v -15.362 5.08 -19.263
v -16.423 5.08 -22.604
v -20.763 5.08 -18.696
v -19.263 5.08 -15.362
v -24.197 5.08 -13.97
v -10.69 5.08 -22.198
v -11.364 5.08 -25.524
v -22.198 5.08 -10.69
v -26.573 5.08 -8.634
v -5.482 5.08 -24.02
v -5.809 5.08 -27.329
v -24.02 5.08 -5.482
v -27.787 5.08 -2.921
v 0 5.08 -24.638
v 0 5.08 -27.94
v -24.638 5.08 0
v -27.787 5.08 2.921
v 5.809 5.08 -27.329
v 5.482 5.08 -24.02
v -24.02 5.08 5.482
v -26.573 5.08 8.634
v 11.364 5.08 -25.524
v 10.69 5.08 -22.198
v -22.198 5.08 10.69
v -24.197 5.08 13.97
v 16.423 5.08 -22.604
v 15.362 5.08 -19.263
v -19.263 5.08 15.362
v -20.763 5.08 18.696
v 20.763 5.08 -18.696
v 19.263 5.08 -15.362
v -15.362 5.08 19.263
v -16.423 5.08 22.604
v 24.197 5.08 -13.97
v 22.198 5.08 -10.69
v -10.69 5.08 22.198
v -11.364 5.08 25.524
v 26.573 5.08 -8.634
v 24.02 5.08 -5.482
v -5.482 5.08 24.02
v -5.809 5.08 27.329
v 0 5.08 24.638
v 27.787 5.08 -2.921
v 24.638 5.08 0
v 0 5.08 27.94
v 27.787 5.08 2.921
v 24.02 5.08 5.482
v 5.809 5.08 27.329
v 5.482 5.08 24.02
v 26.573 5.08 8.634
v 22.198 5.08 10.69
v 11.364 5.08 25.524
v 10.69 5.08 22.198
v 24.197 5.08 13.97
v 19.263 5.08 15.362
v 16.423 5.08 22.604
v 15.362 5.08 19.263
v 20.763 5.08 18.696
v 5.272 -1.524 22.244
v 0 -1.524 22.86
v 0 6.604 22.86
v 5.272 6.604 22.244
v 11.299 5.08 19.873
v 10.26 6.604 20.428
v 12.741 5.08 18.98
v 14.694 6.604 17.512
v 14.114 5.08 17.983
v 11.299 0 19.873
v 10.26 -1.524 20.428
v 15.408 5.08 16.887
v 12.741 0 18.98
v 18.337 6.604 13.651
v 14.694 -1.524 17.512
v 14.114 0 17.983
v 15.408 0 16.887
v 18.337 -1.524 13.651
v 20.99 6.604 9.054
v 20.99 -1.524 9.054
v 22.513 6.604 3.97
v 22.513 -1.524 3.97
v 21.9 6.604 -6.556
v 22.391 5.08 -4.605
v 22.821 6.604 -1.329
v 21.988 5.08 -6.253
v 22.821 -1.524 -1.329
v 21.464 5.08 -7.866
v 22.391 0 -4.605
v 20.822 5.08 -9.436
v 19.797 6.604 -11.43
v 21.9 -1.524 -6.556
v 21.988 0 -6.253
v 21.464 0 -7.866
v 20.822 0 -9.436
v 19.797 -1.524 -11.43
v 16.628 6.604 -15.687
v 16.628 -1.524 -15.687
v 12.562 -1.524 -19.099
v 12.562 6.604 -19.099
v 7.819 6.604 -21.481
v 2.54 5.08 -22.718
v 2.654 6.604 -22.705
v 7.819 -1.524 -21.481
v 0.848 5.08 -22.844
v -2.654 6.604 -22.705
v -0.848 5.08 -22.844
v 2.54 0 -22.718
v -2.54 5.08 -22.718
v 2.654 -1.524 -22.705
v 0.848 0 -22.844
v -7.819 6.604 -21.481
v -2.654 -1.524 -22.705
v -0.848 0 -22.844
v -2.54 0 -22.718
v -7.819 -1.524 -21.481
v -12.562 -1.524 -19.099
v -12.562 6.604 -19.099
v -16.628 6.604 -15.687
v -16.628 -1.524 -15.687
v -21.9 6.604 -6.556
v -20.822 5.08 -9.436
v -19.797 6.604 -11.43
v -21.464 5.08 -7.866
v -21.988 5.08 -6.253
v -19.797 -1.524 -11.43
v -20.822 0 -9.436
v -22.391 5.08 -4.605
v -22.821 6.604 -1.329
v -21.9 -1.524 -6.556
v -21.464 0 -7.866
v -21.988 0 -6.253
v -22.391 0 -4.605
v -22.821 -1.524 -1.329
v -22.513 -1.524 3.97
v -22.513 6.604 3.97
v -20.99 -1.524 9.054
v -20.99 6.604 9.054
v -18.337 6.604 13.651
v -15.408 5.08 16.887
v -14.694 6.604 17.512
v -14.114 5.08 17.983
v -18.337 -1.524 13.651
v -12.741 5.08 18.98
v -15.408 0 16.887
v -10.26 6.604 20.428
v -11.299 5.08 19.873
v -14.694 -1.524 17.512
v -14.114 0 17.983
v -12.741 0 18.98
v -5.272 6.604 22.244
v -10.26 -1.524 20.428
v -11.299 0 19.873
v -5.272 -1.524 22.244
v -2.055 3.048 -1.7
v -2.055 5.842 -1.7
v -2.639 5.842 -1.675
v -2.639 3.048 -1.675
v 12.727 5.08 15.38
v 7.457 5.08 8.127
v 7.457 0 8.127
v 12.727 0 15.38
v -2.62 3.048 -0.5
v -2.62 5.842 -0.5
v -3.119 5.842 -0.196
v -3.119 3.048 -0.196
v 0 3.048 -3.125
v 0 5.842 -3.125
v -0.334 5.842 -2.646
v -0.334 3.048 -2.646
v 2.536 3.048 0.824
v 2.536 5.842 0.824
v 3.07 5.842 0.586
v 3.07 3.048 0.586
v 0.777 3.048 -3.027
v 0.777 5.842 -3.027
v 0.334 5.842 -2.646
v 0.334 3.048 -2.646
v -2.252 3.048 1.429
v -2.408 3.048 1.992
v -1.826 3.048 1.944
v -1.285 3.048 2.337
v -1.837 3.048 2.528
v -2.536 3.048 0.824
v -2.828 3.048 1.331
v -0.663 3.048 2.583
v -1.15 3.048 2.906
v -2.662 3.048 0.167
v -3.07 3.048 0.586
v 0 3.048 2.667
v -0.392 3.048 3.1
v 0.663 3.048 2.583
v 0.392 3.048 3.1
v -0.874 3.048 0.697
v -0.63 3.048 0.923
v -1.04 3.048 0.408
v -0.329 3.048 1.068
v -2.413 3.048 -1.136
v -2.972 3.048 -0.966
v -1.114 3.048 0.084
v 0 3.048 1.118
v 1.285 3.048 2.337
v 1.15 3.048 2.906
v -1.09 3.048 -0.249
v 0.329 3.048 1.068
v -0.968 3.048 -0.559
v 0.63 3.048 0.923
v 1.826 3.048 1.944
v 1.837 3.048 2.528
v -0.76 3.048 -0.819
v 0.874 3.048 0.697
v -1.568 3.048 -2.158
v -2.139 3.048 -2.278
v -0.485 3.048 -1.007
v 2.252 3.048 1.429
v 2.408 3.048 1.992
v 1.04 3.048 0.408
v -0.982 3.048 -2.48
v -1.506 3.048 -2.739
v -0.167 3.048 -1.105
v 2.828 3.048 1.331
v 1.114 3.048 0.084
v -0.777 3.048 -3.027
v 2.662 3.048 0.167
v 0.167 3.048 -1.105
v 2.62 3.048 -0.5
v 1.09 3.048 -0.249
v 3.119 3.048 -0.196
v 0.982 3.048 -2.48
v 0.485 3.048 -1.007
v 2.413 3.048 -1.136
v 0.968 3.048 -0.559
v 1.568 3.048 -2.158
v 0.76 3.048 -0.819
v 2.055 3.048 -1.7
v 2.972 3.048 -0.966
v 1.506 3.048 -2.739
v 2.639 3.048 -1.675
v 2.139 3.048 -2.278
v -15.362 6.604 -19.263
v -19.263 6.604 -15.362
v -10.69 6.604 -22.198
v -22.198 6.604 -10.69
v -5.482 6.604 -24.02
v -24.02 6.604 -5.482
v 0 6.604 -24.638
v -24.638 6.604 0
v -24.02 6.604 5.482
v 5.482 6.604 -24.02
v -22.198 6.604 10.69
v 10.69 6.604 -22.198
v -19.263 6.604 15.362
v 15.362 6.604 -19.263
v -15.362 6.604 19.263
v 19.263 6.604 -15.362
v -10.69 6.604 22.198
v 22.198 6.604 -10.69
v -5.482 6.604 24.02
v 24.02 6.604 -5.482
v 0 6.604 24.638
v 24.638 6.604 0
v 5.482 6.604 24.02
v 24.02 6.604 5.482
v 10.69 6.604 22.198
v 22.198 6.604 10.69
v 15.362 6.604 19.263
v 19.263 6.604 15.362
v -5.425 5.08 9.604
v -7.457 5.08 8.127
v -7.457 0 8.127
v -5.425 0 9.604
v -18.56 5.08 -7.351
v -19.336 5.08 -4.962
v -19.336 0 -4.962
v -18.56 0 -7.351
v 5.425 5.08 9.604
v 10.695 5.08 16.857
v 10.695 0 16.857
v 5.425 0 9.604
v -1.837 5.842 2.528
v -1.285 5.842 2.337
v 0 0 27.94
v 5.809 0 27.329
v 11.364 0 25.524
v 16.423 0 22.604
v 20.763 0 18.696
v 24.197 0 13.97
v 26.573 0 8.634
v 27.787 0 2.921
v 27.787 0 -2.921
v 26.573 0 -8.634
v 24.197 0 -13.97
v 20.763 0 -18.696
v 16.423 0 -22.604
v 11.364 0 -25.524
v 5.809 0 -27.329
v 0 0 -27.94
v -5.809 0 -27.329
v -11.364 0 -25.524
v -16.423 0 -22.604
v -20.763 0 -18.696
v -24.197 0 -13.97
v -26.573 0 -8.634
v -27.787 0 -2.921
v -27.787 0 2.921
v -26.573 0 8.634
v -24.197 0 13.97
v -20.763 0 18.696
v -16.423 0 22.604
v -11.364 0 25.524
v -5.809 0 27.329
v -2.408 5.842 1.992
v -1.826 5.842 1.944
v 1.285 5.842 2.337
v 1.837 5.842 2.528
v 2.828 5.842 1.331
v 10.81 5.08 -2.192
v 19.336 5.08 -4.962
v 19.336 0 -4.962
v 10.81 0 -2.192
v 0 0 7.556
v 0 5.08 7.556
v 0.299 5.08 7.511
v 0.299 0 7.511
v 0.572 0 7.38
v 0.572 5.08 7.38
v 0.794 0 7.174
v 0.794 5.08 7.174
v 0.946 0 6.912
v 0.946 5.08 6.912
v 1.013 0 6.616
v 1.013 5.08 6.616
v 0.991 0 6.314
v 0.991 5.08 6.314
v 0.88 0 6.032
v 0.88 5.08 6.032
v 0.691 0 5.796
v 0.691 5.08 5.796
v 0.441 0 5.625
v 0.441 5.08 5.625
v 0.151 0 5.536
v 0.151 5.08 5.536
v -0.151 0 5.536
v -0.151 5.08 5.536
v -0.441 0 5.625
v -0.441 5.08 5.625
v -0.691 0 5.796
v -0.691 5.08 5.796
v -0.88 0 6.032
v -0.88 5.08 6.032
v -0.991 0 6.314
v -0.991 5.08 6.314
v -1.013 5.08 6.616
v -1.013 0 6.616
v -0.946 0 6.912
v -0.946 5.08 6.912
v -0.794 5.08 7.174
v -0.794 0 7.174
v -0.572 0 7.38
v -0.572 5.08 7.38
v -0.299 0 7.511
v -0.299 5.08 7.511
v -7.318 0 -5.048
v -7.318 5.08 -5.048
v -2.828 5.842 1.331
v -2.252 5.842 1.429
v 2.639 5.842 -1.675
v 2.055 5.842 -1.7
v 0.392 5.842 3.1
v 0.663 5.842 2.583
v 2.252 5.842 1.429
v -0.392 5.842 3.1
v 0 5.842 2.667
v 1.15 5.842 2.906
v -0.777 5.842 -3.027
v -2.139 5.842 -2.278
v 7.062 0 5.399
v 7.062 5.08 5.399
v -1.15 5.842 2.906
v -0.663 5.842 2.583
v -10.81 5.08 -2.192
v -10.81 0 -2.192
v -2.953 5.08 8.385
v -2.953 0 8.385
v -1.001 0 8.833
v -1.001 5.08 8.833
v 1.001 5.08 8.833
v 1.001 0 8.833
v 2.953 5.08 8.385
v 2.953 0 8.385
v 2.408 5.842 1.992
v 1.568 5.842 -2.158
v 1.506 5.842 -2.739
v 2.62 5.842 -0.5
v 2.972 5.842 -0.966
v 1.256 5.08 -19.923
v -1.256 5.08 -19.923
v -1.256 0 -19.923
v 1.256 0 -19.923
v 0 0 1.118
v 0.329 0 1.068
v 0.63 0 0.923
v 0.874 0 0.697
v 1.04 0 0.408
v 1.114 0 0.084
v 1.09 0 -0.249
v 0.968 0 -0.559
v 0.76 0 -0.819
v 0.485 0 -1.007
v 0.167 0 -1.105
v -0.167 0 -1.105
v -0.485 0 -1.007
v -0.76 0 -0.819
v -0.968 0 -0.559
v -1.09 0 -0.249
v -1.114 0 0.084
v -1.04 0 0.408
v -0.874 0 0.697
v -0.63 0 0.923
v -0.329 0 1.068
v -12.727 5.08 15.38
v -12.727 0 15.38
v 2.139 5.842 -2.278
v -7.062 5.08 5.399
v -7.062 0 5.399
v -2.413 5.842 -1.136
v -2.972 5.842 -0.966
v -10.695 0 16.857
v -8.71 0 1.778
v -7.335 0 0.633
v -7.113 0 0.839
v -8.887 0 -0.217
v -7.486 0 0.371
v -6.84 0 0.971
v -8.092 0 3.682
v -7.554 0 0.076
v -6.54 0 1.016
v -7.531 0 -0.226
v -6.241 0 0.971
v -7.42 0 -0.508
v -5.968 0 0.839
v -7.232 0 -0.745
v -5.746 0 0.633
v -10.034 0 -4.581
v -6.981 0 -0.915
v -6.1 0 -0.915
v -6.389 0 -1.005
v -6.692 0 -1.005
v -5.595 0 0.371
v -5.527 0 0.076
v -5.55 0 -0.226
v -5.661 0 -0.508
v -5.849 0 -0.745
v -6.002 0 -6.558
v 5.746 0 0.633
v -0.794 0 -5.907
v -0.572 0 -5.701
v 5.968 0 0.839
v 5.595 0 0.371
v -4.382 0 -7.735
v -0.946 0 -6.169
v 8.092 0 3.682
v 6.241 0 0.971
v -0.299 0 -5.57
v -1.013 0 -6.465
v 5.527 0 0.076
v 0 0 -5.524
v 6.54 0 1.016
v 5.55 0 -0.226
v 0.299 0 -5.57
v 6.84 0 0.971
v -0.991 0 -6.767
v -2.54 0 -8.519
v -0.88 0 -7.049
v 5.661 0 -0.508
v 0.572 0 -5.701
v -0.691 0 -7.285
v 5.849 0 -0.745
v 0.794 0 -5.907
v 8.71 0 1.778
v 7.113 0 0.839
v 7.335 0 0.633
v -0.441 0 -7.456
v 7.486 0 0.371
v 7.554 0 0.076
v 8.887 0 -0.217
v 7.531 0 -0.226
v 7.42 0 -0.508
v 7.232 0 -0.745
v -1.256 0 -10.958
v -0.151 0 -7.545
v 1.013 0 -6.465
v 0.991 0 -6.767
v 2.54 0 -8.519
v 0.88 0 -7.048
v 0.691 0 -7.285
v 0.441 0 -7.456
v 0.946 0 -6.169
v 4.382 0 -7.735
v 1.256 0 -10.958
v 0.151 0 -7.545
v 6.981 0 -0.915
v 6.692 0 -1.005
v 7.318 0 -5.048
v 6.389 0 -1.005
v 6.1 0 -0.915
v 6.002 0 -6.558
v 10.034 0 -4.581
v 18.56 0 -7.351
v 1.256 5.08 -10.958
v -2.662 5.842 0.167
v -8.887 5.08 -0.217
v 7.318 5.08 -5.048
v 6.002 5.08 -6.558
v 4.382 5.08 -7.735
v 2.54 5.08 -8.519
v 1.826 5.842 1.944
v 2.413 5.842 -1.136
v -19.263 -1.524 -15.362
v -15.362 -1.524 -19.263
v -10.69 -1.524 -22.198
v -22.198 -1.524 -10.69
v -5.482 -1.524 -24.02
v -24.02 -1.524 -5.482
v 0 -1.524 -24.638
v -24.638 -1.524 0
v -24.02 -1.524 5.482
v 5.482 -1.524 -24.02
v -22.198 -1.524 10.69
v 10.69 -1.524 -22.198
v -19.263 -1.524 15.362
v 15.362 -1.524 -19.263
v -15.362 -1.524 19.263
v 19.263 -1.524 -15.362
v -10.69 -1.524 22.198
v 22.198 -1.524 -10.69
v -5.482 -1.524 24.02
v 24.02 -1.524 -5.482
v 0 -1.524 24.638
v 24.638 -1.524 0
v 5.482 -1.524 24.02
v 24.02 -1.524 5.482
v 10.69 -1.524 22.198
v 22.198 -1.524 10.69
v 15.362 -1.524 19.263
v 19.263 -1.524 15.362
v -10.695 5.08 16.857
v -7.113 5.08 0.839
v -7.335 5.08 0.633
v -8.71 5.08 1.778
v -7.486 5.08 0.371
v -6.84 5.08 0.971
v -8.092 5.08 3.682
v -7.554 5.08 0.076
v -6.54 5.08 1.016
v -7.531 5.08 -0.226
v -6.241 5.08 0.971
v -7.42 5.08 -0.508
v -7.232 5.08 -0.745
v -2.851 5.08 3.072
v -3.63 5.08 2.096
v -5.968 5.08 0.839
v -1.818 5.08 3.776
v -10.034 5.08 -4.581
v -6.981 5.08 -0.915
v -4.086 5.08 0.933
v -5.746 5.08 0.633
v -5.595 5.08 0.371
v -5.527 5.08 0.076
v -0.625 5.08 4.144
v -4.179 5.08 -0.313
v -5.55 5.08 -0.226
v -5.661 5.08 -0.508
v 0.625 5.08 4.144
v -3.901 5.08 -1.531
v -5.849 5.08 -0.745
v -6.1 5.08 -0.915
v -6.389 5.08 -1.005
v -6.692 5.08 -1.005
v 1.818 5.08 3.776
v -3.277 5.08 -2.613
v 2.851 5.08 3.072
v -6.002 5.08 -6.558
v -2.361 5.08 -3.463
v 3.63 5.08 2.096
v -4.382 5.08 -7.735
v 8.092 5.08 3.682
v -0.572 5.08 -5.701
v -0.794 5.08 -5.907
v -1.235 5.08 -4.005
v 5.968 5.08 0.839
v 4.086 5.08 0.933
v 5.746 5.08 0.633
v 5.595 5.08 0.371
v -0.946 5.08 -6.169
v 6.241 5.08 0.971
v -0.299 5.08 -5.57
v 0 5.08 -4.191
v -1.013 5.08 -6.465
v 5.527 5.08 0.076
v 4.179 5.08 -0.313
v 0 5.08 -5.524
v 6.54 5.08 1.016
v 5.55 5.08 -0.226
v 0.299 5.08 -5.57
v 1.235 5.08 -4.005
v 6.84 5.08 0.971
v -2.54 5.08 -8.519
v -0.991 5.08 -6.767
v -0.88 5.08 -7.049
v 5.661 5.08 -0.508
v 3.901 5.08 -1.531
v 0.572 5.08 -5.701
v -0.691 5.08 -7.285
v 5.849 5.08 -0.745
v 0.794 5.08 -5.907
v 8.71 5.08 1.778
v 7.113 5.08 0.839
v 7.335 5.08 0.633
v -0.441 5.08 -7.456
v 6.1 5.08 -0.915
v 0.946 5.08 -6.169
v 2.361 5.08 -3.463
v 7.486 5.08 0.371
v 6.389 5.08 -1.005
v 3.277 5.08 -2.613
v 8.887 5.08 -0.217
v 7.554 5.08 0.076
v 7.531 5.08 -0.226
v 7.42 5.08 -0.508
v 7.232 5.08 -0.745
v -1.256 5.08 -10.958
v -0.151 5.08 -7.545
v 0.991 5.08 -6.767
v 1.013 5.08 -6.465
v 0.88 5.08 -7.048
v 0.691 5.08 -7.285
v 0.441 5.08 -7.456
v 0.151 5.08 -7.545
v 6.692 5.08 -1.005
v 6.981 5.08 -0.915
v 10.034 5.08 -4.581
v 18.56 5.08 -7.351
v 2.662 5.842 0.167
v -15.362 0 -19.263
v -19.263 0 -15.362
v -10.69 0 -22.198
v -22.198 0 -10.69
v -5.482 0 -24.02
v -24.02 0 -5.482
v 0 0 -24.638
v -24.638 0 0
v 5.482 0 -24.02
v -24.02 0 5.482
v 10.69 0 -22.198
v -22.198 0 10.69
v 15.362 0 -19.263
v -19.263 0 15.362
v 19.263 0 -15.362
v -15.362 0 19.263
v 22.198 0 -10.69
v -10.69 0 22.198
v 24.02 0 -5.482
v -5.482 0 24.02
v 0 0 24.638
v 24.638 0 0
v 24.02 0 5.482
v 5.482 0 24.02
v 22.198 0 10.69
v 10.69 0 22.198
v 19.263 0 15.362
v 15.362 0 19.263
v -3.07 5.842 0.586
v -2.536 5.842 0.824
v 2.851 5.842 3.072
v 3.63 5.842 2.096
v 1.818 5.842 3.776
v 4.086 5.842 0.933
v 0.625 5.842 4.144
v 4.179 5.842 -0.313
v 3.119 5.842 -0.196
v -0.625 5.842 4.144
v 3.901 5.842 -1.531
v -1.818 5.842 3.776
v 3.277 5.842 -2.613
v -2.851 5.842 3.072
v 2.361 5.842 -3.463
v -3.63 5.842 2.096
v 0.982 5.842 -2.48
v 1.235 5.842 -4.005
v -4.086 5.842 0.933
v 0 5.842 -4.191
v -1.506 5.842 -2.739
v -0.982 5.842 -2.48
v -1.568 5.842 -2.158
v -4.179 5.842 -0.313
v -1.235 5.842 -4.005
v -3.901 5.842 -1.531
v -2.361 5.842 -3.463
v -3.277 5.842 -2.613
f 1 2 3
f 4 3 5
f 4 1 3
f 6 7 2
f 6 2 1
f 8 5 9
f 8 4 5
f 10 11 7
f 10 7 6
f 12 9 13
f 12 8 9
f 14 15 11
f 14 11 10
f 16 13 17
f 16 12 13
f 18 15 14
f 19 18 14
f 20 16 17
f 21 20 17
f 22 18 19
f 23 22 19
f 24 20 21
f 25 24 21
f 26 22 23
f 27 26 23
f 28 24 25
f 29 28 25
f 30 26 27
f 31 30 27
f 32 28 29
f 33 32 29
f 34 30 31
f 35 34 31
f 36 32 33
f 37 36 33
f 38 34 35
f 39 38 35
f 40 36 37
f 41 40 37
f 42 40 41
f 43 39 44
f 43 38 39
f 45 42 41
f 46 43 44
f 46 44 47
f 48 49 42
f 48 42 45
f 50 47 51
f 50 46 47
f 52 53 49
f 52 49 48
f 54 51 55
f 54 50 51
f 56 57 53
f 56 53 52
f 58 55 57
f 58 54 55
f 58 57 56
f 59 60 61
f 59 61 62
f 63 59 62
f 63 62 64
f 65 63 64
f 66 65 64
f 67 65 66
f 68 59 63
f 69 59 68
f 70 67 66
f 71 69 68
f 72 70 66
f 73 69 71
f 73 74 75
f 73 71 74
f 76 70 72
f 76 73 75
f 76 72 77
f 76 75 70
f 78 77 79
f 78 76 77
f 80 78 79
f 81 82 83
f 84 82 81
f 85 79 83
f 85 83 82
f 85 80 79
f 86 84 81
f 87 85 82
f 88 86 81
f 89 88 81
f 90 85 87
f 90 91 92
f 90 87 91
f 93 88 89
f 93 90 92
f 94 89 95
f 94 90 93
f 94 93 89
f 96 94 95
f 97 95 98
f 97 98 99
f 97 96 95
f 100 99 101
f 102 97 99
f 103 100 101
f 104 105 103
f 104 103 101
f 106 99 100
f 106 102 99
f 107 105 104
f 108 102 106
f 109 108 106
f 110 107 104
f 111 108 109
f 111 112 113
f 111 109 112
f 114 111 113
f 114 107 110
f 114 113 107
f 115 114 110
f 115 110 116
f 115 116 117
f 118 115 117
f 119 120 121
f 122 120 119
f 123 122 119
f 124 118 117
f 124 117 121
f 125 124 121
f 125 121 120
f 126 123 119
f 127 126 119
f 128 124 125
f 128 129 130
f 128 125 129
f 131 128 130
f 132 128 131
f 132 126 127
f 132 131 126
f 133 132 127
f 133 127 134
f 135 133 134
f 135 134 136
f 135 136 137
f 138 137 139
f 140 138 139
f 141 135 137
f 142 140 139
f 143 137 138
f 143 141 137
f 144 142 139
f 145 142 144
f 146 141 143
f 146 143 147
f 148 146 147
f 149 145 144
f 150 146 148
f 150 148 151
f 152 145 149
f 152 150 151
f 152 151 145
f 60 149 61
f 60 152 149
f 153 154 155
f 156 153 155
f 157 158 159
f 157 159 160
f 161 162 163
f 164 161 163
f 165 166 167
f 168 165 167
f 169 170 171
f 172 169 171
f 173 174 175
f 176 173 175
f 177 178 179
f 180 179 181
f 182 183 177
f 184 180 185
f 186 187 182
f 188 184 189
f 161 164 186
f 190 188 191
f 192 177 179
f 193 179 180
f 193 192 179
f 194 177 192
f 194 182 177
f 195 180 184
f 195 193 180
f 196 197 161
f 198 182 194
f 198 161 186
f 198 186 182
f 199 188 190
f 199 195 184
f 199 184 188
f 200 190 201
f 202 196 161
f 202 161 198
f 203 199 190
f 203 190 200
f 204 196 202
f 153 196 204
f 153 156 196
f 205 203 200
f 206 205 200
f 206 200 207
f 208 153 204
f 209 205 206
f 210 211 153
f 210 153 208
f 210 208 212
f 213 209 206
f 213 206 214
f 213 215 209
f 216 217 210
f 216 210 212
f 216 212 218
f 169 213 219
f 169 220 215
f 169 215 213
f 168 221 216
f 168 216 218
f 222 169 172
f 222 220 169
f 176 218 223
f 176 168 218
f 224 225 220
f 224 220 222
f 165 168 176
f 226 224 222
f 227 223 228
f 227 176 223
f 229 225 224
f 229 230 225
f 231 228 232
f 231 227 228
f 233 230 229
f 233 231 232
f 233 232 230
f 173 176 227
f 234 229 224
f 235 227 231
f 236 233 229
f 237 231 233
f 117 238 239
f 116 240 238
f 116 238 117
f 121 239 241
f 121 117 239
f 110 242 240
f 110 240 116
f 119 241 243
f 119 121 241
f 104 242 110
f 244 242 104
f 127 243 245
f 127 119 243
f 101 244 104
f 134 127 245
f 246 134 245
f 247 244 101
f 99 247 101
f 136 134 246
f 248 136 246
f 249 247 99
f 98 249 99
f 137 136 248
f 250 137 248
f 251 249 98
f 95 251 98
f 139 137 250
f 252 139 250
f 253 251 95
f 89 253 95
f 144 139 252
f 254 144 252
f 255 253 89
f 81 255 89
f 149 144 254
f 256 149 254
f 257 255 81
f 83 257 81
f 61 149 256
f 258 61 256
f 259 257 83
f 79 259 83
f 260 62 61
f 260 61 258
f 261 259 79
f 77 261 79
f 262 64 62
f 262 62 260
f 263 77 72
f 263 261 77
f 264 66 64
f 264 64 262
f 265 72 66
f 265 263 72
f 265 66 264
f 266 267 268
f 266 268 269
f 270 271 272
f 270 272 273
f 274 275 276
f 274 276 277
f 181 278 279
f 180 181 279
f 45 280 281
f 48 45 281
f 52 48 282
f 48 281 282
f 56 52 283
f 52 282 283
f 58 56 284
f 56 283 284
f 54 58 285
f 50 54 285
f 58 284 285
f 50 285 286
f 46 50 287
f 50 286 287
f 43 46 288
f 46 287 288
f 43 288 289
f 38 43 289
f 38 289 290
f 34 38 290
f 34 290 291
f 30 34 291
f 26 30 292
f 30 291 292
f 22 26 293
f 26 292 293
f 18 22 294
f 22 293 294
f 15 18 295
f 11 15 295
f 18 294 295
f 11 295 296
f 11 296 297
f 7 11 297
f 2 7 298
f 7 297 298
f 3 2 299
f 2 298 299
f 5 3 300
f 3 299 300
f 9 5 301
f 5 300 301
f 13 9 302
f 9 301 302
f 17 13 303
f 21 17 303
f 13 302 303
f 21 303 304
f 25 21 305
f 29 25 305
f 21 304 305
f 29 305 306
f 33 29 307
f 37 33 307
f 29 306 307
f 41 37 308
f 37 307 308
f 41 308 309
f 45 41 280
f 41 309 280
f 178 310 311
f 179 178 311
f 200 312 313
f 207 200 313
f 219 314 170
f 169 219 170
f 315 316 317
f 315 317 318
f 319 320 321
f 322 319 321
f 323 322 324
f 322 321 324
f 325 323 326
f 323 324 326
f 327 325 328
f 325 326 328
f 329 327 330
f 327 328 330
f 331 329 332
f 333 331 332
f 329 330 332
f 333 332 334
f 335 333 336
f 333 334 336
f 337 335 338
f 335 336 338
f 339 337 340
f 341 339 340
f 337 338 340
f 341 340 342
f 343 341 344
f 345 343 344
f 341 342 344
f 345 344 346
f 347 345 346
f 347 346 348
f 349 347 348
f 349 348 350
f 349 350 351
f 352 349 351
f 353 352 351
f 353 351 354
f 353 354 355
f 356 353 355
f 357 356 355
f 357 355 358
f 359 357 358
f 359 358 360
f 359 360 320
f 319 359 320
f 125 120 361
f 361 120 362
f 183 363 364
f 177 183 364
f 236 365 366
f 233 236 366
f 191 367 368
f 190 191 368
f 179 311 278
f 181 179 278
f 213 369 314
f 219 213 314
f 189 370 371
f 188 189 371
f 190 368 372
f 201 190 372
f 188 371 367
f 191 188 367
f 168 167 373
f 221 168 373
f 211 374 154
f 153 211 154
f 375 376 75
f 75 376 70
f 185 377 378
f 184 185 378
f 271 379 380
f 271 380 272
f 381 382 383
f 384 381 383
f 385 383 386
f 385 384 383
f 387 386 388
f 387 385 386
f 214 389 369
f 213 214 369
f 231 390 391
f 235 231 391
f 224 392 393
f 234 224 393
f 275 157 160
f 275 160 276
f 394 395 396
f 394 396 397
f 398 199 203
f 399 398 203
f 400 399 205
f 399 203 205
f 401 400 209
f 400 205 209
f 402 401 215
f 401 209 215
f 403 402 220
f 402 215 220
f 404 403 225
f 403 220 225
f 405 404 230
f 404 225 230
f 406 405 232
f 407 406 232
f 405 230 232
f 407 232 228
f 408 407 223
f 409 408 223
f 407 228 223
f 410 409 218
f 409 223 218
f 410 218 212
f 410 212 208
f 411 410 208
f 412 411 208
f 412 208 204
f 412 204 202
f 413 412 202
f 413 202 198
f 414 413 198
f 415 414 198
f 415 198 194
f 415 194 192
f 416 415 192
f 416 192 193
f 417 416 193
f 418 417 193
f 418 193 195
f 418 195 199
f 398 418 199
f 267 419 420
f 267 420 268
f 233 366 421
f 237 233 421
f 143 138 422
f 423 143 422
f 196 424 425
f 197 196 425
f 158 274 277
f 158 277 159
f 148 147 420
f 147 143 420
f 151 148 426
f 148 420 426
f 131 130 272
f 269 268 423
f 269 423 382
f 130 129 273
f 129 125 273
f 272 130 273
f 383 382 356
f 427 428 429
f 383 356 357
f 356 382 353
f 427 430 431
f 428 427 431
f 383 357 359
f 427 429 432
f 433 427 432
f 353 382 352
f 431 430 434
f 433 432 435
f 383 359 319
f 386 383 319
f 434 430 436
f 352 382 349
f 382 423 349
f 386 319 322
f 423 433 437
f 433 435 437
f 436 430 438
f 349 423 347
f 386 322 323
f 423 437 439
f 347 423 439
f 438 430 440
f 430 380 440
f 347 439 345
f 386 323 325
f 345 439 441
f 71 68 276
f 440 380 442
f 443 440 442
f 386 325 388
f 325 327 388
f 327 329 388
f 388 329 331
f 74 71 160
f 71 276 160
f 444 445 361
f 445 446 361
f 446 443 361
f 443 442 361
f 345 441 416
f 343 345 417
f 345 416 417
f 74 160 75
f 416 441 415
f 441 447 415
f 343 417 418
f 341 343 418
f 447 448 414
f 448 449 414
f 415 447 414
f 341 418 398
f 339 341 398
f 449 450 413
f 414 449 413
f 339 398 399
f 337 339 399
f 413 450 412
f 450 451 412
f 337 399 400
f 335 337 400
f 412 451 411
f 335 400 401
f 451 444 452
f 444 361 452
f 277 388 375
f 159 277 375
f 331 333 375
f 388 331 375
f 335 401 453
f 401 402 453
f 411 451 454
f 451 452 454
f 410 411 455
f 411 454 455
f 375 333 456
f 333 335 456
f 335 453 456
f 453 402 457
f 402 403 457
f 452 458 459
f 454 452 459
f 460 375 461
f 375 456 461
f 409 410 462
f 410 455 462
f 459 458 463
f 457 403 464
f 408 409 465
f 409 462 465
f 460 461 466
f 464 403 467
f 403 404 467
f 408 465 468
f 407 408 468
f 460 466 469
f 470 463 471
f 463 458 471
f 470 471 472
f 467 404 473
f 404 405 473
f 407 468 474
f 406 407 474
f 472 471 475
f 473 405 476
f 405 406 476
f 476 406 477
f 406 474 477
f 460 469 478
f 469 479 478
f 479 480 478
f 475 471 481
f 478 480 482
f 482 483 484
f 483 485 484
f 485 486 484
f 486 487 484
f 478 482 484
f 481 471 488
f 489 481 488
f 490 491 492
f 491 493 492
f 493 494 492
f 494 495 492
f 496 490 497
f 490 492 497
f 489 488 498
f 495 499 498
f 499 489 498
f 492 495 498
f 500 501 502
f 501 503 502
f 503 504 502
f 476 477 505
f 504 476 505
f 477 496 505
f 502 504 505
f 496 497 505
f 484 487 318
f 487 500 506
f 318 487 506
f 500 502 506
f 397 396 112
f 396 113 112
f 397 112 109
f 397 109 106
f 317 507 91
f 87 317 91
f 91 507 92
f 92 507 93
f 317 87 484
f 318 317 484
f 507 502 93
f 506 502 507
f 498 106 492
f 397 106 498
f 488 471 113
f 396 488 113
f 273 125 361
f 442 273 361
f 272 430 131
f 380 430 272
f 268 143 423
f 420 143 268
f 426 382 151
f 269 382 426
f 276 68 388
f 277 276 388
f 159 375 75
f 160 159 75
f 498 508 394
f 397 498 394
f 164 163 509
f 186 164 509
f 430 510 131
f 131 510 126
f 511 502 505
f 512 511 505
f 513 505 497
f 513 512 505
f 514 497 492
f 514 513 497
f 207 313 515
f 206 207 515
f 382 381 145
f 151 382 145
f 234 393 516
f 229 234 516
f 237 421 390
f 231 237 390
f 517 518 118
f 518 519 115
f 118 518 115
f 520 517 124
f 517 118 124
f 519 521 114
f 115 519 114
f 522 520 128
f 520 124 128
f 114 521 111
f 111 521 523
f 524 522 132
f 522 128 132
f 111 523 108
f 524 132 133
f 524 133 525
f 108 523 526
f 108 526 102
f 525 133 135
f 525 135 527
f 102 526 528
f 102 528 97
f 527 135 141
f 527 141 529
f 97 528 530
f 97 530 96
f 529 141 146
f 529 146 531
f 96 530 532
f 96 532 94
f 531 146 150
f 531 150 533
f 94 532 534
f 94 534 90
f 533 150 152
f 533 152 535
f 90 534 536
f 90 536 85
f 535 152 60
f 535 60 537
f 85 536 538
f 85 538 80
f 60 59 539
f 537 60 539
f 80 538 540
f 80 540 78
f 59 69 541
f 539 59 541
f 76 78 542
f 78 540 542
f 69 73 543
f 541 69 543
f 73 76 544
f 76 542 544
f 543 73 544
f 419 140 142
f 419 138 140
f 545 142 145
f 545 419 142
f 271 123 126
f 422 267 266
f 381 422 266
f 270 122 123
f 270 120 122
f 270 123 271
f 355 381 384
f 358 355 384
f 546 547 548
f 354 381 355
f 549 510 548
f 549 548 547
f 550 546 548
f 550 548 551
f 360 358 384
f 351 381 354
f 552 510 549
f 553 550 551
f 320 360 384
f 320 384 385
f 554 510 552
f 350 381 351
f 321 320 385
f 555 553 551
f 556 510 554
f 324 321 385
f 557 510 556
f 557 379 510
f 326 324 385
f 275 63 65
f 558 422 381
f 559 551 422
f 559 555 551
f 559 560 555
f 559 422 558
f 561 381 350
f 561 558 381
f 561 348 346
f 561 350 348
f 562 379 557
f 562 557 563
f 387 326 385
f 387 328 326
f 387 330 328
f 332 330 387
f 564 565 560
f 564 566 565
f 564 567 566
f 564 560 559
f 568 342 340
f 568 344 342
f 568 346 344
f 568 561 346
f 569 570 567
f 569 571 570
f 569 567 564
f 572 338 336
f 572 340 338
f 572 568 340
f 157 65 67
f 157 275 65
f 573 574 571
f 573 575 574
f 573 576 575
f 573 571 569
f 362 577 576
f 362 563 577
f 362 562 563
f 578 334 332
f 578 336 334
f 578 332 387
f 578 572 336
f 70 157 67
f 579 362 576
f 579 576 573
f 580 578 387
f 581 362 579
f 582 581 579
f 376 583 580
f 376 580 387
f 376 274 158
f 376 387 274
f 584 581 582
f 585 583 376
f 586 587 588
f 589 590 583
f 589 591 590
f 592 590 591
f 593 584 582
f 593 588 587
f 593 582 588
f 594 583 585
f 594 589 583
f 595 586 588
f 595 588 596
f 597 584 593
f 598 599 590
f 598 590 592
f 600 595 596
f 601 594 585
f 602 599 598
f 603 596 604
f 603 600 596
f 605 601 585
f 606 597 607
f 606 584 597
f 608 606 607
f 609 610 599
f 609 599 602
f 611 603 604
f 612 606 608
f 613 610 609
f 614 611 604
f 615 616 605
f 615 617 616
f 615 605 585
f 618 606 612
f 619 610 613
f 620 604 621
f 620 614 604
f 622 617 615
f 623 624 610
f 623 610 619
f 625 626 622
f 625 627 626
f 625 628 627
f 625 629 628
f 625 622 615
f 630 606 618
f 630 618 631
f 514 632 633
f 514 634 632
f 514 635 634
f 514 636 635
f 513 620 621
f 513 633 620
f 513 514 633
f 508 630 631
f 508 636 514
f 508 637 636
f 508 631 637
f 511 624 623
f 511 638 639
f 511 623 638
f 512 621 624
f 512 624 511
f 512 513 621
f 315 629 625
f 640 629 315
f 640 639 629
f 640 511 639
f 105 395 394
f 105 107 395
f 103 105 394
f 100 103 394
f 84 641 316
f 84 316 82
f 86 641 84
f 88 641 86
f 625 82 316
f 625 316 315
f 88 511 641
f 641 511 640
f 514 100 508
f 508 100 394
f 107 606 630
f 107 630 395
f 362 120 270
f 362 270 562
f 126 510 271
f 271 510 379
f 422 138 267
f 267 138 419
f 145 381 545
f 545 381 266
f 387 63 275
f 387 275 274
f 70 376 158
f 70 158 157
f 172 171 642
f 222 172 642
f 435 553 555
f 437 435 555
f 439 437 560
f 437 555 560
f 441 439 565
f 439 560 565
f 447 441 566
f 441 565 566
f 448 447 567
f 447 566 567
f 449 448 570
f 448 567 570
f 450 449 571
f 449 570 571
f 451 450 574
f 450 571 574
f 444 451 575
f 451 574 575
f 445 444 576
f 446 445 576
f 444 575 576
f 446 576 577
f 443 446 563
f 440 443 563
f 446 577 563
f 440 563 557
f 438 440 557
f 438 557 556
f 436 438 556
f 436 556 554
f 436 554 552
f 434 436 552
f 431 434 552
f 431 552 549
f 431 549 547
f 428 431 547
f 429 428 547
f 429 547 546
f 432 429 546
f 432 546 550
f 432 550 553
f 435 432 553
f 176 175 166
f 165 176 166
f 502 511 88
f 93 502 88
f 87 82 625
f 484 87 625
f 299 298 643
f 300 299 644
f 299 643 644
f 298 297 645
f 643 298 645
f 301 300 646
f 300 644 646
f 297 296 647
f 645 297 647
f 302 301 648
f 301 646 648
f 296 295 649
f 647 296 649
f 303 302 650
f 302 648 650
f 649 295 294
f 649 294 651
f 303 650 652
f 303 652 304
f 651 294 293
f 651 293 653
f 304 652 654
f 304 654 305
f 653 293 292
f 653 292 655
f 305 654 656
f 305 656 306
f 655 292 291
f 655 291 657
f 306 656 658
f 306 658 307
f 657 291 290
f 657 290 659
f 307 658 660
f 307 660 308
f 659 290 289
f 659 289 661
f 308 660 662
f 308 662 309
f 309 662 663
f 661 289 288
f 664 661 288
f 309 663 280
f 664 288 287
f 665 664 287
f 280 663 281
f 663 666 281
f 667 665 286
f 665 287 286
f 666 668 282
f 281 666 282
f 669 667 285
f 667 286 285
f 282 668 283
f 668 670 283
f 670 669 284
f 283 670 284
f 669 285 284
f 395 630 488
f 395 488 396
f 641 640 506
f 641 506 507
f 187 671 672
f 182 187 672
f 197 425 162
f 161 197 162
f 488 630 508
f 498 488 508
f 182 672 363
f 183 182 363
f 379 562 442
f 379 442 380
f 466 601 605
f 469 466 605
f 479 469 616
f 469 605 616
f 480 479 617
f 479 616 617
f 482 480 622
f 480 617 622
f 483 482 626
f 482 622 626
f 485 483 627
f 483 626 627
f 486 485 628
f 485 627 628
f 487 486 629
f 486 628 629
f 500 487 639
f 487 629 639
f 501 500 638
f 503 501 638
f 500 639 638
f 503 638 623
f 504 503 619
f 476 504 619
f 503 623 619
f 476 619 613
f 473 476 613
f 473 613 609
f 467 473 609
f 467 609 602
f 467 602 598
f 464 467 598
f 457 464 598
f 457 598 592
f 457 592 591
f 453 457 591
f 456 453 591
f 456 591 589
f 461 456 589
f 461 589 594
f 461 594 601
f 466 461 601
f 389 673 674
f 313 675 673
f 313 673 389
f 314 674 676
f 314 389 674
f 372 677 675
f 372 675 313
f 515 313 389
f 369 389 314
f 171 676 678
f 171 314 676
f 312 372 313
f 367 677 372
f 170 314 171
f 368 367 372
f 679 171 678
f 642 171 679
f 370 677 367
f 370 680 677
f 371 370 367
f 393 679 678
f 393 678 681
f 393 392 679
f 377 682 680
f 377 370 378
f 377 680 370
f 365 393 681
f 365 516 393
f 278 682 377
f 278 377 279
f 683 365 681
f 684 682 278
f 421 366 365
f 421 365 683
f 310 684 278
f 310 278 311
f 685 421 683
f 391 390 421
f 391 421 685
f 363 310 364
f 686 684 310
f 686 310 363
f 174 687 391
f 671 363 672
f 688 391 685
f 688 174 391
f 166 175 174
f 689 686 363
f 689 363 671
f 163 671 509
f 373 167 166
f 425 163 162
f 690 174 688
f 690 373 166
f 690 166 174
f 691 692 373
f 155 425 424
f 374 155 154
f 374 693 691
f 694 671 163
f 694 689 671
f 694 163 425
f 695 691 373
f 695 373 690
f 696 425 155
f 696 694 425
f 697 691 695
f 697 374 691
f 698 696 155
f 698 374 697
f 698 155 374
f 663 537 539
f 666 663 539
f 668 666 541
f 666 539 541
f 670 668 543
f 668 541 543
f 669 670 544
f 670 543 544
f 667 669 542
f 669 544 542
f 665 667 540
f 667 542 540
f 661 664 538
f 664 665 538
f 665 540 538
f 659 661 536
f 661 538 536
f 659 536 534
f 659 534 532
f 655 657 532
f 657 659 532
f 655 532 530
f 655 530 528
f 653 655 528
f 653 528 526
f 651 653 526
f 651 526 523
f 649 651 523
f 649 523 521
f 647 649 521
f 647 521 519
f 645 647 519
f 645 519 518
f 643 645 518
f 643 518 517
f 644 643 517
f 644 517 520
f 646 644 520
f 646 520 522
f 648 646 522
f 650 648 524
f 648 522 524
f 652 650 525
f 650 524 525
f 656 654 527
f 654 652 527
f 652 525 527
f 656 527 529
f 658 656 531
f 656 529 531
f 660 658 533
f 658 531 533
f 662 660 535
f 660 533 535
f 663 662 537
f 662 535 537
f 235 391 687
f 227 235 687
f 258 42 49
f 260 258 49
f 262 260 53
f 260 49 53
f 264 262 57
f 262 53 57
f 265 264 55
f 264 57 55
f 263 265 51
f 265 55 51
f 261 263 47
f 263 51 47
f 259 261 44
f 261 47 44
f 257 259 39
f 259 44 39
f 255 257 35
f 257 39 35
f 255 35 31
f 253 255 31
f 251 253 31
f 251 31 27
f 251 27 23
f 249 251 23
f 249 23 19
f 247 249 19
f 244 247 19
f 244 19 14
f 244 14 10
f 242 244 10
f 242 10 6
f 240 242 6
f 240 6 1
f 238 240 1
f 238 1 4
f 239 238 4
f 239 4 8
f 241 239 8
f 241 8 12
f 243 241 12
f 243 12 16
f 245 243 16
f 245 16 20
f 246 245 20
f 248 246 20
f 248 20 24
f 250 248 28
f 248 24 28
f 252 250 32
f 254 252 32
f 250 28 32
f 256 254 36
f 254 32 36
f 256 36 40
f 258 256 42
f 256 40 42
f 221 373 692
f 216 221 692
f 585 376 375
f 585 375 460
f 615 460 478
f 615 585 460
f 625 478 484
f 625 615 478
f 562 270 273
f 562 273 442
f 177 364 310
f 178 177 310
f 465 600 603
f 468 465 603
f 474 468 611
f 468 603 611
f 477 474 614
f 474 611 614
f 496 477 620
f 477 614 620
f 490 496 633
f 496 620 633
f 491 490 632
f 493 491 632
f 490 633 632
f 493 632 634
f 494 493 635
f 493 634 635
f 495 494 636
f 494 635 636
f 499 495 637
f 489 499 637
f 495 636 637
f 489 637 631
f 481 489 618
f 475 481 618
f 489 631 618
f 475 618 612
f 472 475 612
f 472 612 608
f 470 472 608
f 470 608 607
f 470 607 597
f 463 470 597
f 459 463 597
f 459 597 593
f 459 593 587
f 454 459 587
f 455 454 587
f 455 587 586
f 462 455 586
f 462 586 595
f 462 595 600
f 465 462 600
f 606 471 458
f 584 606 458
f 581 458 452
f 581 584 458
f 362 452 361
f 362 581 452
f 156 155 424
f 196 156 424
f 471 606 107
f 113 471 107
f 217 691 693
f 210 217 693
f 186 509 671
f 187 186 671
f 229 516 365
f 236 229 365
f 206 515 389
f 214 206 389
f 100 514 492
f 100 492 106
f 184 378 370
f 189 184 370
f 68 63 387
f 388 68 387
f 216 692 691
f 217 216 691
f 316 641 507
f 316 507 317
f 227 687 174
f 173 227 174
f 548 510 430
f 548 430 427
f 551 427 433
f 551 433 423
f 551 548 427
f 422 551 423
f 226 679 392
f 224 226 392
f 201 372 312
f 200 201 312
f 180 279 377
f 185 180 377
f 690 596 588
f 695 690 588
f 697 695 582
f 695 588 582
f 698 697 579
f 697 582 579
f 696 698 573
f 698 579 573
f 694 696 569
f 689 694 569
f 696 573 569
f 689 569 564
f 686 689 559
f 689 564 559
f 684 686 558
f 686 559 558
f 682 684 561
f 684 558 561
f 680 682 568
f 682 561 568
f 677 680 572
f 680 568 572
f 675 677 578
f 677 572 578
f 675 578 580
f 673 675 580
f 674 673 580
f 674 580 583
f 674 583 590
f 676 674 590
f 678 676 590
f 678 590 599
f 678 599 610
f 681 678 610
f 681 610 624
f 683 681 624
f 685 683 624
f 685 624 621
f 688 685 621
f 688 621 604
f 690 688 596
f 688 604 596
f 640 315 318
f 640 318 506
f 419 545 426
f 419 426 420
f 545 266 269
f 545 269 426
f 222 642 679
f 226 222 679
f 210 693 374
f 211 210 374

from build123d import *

# Parameters (mm, degrees)
SKETCH2_R                = 27.94
BOSS_EXTRUDE1_DEPTH      = 5.08
SKETCH3_R                = 22.86
CUT_EXTRUDE1_DEPTH       = 40.838343339
BOSS_EXTRUDE2_DEPTH      = 1.524
BOSS_EXTRUDE2_DEPTH_BACK = 6.604
SKETCH4_R                = 24.638
SKETCH4_R_2              = 22.86
SKETCH5_R                = 8.89
SKETCH5_W                = 5.08
SKETCH5_H                = 18.131594767
SKETCH5_W_2              = 2.51172526
SKETCH5_H_2              = 8.964878854
BOSS_EXTRUDE4_DEPTH      = 5.08
SKETCH6_R                = 4.191
SKETCH6_R_2              = 2.667
BOSS_EXTRUDE5_DEPTH      = 0.762
CUT_EXTRUDE2_START       = -2.794
SKETCH8_R                = 2.667
CUT_EXTRUDE2_DEPTH       = 2.794
CUT_EXTRUDE3_DEPTH       = 2.794
SKETCH10_R               = 1.1176
CUT_EXTRUDE4_DEPTH       = 40.776756831
SKETCH11_R               = 1.016
CUT_EXTRUDE5_DEPTH       = 41.061203377


with BuildPart() as part:
    # Sketch2 → Boss-Extrude1 (new body)
    with BuildSketch(Plane(origin=(0, 0, 0), x_dir=(1, 0, 0), z_dir=(0, 1, 0))):
        with Locations(Location((0, 0, 0), (0, 0, 270))):
            Circle(SKETCH2_R)
    extrude(amount=BOSS_EXTRUDE1_DEPTH)

    # Sketch3 → Cut-Extrude1 (cut, through all)
    with BuildSketch(Plane(origin=(0, 5.08, 0), x_dir=(1, 0, 0), z_dir=(0, 1, 0))):
        with Locations(Location((0, 0, 0), (0, 0, 270))):
            Circle(SKETCH3_R)
    extrude(amount=-CUT_EXTRUDE1_DEPTH, mode=Mode.SUBTRACT)

    # Sketch4 → Boss-Extrude2 (add, two sides: drawn at the far end of the back side and taken through both)
    with BuildSketch(Plane(origin=(0, 5.08, 0), x_dir=(1, 0, 0), z_dir=(0, 1, 0)).offset(-BOSS_EXTRUDE2_DEPTH_BACK)):
        with Locations(Location((0, 0, 0), (0, 0, 270))):
            Circle(SKETCH4_R)
        with Locations(Location((0, 0, 0), (0, 0, 270))):
            Circle(SKETCH4_R_2, mode=Mode.SUBTRACT)
    extrude(amount=BOSS_EXTRUDE2_DEPTH + BOSS_EXTRUDE2_DEPTH_BACK)

    # Sketch5 → Boss-Extrude4 (add)
    # profile 1 of 6: a face of its own
    with BuildSketch(Plane(origin=(0, 5.08, 0), x_dir=(1, 0, 0), z_dir=(0, 1, 0))):
        Circle(SKETCH5_R)
    # profile 2 of 6: a face of its own
    with BuildSketch(Plane(origin=(0, 5.08, 0), x_dir=(1, 0, 0), z_dir=(0, 1, 0))):
        Polygon((5.278203535, 4.385706339), (22.522374889, 9.988677257), (24.092181221, 5.157310154), (6.848009867, -0.445660764), align=None)
        Polygon((10.810222047, 2.19196195), (10.034056257, 4.580754625), (18.560162709, 7.351054544), (19.336328499, 4.962261868), align=None, mode=Mode.SUBTRACT)
    # profile 3 of 6: a face of its own
    with BuildSketch(Plane(origin=(0, 5.08, 0), x_dir=(1, 0, 0), z_dir=(0, 1, 0))):
        with Locations((0, 15.440925042)):
            Rectangle(SKETCH5_W, SKETCH5_H)
        with Locations((0, 15.440925041)):
            Rectangle(SKETCH5_W_2, SKETCH5_H_2, mode=Mode.SUBTRACT)
    # profile 4 of 6: a face of its own
    with BuildSketch(Plane(origin=(0, 5.08, 0), x_dir=(1, 0, 0), z_dir=(0, 1, 0))):
        Polygon((5.802109184, -3.664612076), (16.459593189, -18.333380377), (12.349786858, -21.319329459), (1.692302853, -6.650561157), align=None)
        Polygon((5.425222021, -9.603778627), (7.457250442, -8.127423562), (12.726674021, -15.380162907), (10.6946456, -16.856517973), align=None, mode=Mode.SUBTRACT)
    # profile 5 of 6: a face of its own
    with BuildSketch(Plane(origin=(0, 5.08, 0), x_dir=(1, 0, 0), z_dir=(0, 1, 0))):
        Polygon((-1.692302853, -6.650561157), (-12.349786858, -21.319329459), (-16.459593189, -18.333380377), (-5.802109184, -3.664612076), align=None)
        Polygon((-7.457250442, -8.127423562), (-5.425222021, -9.603778627), (-10.6946456, -16.856517973), (-12.726674021, -15.380162907), align=None, mode=Mode.SUBTRACT)
    # profile 6 of 6: a face of its own
    with BuildSketch(Plane(origin=(0, 5.08, 0), x_dir=(1, 0, 0), z_dir=(0, 1, 0))):
        Polygon((-6.848009867, -0.445660764), (-24.092181221, 5.157310154), (-22.522374889, 9.988677257), (-5.278203535, 4.385706339), align=None)
        Polygon((-10.034056257, 4.580754625), (-10.810222047, 2.19196195), (-19.336328499, 4.962261868), (-18.560162709, 7.351054544), align=None, mode=Mode.SUBTRACT)
    extrude(amount=-BOSS_EXTRUDE4_DEPTH)

    # Sketch6 → Boss-Extrude5 (add)
    with BuildSketch(Plane(origin=(0, 5.08, 0), x_dir=(1, 0, 0), z_dir=(0, 1, 0))):
        with Locations(Location((0, 0, 0), (0, 0, 90))):
            Circle(SKETCH6_R)
        with Locations(Location((0, 0, 0), (0, 0, 90))):
            Circle(SKETCH6_R_2, mode=Mode.SUBTRACT)
    extrude(amount=BOSS_EXTRUDE5_DEPTH)

    # Sketch8 → Cut-Extrude2 (cut)
    with BuildSketch(Plane(origin=(0, 5.842, 0), x_dir=(1, 0, 0), z_dir=(0, 1, 0)).offset(CUT_EXTRUDE2_START)):
        with Locations(Location((0, 0, 0), (0, 0, 90))):
            Circle(SKETCH8_R)
    extrude(amount=CUT_EXTRUDE2_DEPTH, mode=Mode.SUBTRACT)

    # Sketch9 → Cut-Extrude3 (cut)
    with BuildSketch(Plane(origin=(0, 5.842, 0), x_dir=(1, 0, 0), z_dir=(0, 1, 0))):
        Polygon((0, 3.125091392), (-0.334263734, 2.645969908), (-0.777178626, 3.026910899), (-0.981788182, 2.479713888), (-1.50552426, 2.738538463), (-1.567623268, 2.157648324), (-2.139272268, 2.278093583), (-2.054958818, 1.700009781), (-2.638601932, 1.674507705), (-2.413173749, 1.135553371), (-2.972138533, 0.965706349), (-2.619760098, 0.499745966), (-3.118924738, 0.196226112), (-2.661737285, -0.167462316), (-3.069737432, -0.585583733), (-2.536467729, -0.824148324), (-2.827667233, -1.330599199), (-2.251822577, -1.429050062), (-2.407924303, -1.992008224), (-1.825687132, -1.944159329), (-1.836882632, -2.528252045), (-1.284837049, -2.337109916), (-1.150422871, -2.905636493), (-0.663255929, -2.583211291), (-0.391677809, -3.100449113), (0, -2.667), (0.391677809, -3.100449113), (0.663255929, -2.583211291), (1.150422871, -2.905636493), (1.284837049, -2.337109916), (1.836882632, -2.528252045), (1.825687132, -1.944159329), (2.407924303, -1.992008224), (2.251822577, -1.429050062), (2.827667233, -1.330599199), (2.536467729, -0.824148324), (3.069737432, -0.585583733), (2.661737285, -0.167462316), (3.118924738, 0.196226112), (2.619760098, 0.499745966), (2.972138533, 0.965706349), (2.413173749, 1.135553371), (2.638601932, 1.674507705), (2.054958818, 1.700009781), (2.139272268, 2.278093583), (1.567623268, 2.157648324), (1.50552426, 2.738538463), (0.981788182, 2.479713888), (0.777178626, 3.026910899), (0.334263734, 2.645969908), align=None)
    extrude(amount=-CUT_EXTRUDE3_DEPTH, mode=Mode.SUBTRACT)

    # Sketch10 → Cut-Extrude4 (cut, through all)
    with BuildSketch(Plane(origin=(0, 3.048, 0), x_dir=(1, 0, 0), z_dir=(0, 1, 0))):
        with Locations(Location((0, 0, 0), (0, 0, 270))):
            Circle(SKETCH10_R)
    extrude(amount=-CUT_EXTRUDE4_DEPTH, mode=Mode.SUBTRACT)

    # Sketch11 → Cut-Extrude5 (cut, through all)
    with BuildSketch(Plane(origin=(0, 5.08, 0), x_dir=(1, 0, 0), z_dir=(0, 1, 0))):
        with Locations(Location((0, 6.5405, 0), (0, 0, 270))):
            Circle(SKETCH11_R)
        with Locations(Location((6.5405, 0, 0), (0, 0, 270))):
            Circle(SKETCH11_R)
        with Locations(Location((0, -6.5405, 0), (0, 0, 270))):
            Circle(SKETCH11_R)
        with Locations(Location((-6.5405, 0, 0), (0, 0, 270))):
            Circle(SKETCH11_R)
    extrude(amount=-CUT_EXTRUDE5_DEPTH, mode=Mode.SUBTRACT)


solid = part.part
